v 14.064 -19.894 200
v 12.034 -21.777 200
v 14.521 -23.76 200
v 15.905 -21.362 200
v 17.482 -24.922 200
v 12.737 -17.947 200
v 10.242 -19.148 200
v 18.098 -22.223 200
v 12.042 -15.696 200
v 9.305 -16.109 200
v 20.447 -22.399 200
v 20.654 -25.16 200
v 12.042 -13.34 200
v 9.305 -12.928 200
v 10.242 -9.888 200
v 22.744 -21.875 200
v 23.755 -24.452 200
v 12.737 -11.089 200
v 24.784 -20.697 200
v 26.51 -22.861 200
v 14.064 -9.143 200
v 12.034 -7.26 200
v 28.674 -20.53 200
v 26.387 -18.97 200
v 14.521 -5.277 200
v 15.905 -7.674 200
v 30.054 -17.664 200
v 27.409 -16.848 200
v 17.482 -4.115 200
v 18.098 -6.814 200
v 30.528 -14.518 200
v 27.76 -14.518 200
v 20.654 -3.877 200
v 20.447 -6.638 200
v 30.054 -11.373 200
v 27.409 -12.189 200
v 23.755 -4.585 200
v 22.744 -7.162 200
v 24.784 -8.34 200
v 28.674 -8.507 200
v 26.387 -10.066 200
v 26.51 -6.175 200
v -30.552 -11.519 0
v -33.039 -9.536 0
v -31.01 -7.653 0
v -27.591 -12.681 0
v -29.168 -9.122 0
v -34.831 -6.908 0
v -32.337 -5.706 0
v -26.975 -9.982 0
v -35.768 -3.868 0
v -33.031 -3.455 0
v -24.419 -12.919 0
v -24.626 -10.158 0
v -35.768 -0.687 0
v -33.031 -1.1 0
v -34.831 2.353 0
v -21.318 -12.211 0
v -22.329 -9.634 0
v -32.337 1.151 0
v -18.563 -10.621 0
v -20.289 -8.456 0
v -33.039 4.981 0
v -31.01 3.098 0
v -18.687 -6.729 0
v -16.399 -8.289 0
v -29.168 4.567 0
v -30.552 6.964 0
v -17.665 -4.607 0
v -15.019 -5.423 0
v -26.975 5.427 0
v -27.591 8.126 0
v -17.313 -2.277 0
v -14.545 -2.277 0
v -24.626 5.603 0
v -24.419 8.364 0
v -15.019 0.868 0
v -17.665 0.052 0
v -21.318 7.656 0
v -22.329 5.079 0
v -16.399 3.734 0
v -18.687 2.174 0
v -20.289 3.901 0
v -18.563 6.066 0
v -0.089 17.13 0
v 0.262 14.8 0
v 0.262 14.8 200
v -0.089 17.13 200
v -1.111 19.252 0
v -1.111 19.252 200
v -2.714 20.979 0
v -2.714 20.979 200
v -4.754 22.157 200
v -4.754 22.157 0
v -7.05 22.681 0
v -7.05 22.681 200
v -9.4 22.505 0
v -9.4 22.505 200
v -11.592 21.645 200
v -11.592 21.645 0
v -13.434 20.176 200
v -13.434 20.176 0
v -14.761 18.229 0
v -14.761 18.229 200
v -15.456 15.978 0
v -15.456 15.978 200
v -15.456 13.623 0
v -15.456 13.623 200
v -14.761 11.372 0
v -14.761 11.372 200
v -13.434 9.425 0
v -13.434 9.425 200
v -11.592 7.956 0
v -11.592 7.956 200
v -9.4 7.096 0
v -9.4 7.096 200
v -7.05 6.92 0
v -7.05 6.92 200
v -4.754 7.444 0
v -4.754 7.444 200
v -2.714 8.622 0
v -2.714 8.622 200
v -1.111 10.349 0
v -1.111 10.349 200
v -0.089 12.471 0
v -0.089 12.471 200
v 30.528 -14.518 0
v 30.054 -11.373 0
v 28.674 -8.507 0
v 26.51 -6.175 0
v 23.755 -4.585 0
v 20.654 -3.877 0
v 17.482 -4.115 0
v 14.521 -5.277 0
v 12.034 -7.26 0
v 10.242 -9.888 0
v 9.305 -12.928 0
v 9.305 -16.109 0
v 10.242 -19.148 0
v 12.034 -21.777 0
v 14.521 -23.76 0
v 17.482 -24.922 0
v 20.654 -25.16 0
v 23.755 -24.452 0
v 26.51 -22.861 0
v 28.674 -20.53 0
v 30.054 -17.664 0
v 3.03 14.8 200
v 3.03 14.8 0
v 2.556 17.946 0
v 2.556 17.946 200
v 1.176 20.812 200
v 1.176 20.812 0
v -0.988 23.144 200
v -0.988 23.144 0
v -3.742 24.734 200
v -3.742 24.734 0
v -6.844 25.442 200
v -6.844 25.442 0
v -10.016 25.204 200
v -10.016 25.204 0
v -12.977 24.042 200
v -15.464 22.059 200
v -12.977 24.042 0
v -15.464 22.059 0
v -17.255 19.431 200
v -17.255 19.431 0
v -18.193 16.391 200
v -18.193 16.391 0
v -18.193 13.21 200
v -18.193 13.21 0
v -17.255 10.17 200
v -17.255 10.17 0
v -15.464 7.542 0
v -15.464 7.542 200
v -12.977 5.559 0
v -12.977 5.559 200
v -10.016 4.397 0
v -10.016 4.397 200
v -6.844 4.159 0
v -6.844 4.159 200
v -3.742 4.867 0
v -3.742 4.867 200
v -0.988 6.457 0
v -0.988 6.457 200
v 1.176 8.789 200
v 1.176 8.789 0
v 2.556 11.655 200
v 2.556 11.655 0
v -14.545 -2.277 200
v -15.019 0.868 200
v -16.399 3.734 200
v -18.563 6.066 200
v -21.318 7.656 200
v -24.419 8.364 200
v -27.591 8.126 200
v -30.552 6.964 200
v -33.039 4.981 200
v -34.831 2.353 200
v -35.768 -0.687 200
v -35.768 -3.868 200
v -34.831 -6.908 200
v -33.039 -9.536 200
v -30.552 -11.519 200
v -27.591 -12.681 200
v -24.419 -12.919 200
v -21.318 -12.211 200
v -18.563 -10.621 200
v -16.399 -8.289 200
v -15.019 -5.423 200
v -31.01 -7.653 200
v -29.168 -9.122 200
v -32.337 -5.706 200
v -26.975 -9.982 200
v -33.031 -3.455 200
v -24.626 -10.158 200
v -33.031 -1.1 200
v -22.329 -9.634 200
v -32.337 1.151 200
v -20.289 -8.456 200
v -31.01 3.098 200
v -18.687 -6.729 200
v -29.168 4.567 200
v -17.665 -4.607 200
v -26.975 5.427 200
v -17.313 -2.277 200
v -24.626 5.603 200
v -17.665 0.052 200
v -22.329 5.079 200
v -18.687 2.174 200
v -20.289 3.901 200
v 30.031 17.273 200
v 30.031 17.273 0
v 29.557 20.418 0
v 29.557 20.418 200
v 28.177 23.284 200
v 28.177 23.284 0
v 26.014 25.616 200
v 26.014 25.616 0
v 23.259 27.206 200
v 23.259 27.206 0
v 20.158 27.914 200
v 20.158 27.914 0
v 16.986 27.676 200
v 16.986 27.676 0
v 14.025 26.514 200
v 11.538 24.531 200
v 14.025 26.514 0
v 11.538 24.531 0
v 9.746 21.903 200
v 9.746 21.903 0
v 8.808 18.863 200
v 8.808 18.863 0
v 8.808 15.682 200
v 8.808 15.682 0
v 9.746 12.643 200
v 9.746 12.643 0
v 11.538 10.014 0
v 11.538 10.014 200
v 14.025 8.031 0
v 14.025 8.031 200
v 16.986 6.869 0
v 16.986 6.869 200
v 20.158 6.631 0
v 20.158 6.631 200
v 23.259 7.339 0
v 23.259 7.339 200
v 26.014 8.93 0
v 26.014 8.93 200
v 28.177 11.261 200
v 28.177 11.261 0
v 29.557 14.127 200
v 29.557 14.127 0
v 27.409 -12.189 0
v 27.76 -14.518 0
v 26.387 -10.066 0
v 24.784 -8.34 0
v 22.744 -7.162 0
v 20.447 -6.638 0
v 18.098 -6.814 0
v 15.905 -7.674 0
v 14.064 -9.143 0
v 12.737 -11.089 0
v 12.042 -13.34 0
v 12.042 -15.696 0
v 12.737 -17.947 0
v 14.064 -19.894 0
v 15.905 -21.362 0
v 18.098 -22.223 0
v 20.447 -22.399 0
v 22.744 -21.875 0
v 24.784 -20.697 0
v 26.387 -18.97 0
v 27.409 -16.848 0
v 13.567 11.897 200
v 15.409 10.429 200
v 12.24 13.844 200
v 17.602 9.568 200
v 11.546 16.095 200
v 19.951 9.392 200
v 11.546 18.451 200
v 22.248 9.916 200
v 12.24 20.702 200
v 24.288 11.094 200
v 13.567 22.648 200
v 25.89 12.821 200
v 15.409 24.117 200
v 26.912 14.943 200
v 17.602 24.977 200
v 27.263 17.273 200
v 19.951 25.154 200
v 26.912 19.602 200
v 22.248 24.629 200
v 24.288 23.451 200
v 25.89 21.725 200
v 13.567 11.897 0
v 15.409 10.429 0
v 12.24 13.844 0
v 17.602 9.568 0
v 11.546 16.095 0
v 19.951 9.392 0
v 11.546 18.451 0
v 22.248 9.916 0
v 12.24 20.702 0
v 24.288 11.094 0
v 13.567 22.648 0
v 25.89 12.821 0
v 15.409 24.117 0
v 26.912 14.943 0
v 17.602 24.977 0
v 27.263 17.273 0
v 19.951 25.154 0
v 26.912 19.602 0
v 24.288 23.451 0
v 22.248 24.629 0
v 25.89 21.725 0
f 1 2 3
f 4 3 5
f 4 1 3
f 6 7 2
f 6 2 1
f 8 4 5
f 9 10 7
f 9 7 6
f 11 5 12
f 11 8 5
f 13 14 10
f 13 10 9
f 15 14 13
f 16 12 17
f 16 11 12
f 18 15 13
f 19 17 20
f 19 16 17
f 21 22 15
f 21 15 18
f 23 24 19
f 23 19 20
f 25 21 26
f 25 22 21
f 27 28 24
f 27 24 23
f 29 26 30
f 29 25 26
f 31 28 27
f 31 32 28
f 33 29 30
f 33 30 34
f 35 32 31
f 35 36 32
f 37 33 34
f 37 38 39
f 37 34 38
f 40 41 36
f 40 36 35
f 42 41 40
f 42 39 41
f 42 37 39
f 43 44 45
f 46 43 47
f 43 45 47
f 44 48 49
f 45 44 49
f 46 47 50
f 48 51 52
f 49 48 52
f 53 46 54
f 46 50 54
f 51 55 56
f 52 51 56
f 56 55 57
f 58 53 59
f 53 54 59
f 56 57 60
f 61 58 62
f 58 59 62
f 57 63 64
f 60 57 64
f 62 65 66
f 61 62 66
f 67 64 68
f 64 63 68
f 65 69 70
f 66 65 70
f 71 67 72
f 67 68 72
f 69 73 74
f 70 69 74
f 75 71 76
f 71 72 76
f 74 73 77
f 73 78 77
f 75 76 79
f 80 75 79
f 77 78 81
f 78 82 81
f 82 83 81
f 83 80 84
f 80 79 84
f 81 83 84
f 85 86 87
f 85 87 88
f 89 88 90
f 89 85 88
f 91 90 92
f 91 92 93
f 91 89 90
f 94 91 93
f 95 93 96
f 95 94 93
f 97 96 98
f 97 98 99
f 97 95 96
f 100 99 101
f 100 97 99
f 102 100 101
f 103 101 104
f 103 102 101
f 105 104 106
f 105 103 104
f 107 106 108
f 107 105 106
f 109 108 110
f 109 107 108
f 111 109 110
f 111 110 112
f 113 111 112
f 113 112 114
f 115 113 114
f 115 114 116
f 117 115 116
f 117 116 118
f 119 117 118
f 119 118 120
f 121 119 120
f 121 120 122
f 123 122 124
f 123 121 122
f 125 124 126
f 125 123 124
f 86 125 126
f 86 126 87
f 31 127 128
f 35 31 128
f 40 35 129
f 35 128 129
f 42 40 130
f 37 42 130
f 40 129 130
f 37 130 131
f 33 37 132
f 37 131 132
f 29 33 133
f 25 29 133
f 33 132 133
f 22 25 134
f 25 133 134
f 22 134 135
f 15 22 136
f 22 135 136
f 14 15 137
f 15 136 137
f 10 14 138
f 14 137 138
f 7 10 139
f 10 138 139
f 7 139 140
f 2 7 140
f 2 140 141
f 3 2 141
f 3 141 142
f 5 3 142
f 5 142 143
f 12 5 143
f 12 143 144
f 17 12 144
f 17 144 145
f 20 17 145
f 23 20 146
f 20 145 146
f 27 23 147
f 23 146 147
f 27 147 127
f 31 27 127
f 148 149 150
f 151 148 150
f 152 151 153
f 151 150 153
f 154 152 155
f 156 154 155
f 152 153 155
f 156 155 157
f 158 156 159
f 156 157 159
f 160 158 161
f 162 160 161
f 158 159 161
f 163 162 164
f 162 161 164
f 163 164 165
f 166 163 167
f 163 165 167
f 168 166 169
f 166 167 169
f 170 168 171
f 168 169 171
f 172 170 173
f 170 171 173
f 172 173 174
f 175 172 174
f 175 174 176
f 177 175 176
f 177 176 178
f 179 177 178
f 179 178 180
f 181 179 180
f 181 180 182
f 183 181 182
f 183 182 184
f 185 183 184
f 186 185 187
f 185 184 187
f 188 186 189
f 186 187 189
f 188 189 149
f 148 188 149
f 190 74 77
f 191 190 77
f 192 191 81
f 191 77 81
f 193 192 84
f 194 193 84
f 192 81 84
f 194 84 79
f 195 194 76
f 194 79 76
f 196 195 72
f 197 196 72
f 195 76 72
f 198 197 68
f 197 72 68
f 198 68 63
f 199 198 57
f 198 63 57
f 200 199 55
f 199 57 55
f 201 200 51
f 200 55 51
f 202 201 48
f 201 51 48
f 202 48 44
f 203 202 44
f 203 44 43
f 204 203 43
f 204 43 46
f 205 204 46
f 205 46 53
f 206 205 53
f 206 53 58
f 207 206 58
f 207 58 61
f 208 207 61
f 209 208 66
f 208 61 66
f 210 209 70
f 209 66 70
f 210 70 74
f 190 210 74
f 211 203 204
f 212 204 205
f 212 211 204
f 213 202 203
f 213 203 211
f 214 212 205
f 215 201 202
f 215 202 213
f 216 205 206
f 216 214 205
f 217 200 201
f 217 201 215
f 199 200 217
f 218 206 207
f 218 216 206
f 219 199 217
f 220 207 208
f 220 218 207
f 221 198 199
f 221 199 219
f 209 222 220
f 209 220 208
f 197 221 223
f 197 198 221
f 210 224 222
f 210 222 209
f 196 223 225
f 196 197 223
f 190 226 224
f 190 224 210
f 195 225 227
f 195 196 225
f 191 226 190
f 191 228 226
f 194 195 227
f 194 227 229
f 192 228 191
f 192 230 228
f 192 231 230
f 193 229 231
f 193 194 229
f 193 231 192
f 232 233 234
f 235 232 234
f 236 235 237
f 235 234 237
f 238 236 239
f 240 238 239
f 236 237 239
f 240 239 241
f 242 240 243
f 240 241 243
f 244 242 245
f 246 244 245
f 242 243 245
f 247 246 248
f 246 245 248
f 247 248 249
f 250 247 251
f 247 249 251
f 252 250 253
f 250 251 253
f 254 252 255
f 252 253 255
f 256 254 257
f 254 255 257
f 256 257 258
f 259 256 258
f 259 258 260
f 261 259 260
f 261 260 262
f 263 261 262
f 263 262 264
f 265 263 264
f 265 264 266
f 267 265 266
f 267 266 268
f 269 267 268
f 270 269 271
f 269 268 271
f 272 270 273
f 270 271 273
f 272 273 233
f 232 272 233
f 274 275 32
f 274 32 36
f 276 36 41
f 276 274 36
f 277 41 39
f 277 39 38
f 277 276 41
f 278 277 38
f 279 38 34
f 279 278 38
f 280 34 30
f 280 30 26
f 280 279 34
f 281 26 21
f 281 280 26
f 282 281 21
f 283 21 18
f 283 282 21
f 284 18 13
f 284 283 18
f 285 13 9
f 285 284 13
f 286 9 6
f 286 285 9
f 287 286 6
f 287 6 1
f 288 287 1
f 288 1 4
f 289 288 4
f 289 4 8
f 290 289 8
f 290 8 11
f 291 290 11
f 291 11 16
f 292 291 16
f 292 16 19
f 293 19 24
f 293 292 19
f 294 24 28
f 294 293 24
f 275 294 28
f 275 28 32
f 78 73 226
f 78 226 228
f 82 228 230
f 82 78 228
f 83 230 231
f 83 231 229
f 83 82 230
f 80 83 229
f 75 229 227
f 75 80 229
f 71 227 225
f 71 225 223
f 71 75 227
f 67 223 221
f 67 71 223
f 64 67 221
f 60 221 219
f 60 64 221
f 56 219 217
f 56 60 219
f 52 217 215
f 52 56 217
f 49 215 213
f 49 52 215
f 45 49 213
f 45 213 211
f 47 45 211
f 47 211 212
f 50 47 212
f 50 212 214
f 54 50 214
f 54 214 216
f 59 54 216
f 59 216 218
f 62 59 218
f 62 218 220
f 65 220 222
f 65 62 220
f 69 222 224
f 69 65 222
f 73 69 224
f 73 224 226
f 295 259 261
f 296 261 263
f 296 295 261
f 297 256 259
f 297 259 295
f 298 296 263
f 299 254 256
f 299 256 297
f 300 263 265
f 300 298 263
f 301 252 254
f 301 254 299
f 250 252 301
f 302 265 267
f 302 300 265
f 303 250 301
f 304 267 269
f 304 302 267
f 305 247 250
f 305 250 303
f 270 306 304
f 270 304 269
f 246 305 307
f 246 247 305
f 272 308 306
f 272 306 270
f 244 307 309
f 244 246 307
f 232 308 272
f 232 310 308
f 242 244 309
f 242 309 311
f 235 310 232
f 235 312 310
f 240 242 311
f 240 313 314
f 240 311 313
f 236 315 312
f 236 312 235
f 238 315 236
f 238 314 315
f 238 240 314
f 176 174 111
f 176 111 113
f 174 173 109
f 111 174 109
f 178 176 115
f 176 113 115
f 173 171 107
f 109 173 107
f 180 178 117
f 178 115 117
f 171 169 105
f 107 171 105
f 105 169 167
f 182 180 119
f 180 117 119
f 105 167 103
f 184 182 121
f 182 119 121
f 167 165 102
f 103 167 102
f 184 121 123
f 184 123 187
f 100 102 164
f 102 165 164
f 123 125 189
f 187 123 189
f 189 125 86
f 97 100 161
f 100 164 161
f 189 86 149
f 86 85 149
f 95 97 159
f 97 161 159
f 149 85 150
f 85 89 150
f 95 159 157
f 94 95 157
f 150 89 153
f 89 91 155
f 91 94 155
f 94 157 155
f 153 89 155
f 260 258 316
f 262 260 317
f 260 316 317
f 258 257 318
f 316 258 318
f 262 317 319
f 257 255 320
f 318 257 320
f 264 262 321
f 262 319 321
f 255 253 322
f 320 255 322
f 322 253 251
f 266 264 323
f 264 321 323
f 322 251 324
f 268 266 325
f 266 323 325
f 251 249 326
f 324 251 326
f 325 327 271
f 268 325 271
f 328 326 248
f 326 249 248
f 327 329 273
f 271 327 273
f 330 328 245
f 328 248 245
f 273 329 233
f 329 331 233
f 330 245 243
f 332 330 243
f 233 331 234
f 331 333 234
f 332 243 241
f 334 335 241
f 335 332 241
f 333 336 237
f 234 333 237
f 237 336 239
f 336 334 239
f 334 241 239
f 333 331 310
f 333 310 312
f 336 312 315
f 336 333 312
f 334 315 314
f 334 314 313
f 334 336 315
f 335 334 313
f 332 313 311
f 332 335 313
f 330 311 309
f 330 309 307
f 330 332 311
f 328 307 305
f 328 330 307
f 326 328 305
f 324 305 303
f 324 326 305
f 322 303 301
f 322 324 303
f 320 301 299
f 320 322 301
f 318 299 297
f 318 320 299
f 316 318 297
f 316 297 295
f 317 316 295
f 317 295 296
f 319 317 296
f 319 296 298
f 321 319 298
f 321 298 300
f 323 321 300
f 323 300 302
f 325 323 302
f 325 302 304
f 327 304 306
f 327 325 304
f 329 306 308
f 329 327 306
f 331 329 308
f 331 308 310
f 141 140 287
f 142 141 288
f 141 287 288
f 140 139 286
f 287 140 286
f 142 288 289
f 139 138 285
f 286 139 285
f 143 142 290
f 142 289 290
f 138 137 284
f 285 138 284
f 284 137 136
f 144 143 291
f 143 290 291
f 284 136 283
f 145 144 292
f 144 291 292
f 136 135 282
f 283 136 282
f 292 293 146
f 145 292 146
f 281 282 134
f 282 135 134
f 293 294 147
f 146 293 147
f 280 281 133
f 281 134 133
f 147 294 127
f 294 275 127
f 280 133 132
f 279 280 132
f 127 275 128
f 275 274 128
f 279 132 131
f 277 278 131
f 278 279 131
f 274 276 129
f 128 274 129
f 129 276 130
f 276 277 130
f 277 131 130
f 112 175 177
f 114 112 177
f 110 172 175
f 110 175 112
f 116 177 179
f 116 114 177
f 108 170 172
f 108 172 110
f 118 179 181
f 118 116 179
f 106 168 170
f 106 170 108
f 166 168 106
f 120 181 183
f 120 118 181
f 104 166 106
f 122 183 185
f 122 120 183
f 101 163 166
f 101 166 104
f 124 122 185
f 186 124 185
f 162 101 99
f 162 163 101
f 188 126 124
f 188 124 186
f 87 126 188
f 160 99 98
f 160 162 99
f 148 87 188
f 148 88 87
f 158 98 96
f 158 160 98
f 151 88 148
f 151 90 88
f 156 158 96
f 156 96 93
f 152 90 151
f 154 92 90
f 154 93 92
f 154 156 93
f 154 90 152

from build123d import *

# Parameters (mm, degrees)
F0_R     = 10.671195
F0_R_2   = 7.902929
F1_DEPTH = 200
F2_R     = 10.671195
F2_R_2   = 7.902929
F3_DEPTH = 200
F4_DEPTH = 200
F5_DEPTH = 200


with BuildPart() as f1:
    # F0 (on Top) → F1 (new body)
    with BuildSketch(Plane.XY):
        with Locations((19.360263, 17.272713)):
            Circle(F0_R)
        with Locations((19.360263, 17.272713)):
            Circle(F0_R_2, mode=Mode.SUBTRACT)
    extrude(amount=F1_DEPTH)


with BuildPart() as f3:
    # F2 (on Top) → F3 (new body)
    with BuildSketch(Plane.XY):
        with Locations((19.856874, -14.518355)):
            Circle(F2_R)
        with Locations((19.856874, -14.518355)):
            Circle(F2_R_2, mode=Mode.SUBTRACT)
    extrude(amount=F3_DEPTH)


with BuildPart() as f4:
    # F2 (on Top) → F4 (new body)
    with BuildSketch(Plane.XY):
        with Locations((-25.216391, -2.277479)):
            Circle(F2_R)
        with Locations((-25.216391, -2.277479)):
            Circle(F2_R_2, mode=Mode.SUBTRACT)
    extrude(amount=F4_DEPTH)


with BuildPart() as f5:
    # F2 (on Top) → F5 (new body)
    with BuildSketch(Plane.XY):
        with Locations((-7.640985, 14.800491)):
            Circle(F2_R)
        with Locations((-7.640985, 14.800491)):
            Circle(F2_R_2, mode=Mode.SUBTRACT)
    extrude(amount=F5_DEPTH)


solid = Compound([f1.part, f3.part, f4.part, f5.part])
